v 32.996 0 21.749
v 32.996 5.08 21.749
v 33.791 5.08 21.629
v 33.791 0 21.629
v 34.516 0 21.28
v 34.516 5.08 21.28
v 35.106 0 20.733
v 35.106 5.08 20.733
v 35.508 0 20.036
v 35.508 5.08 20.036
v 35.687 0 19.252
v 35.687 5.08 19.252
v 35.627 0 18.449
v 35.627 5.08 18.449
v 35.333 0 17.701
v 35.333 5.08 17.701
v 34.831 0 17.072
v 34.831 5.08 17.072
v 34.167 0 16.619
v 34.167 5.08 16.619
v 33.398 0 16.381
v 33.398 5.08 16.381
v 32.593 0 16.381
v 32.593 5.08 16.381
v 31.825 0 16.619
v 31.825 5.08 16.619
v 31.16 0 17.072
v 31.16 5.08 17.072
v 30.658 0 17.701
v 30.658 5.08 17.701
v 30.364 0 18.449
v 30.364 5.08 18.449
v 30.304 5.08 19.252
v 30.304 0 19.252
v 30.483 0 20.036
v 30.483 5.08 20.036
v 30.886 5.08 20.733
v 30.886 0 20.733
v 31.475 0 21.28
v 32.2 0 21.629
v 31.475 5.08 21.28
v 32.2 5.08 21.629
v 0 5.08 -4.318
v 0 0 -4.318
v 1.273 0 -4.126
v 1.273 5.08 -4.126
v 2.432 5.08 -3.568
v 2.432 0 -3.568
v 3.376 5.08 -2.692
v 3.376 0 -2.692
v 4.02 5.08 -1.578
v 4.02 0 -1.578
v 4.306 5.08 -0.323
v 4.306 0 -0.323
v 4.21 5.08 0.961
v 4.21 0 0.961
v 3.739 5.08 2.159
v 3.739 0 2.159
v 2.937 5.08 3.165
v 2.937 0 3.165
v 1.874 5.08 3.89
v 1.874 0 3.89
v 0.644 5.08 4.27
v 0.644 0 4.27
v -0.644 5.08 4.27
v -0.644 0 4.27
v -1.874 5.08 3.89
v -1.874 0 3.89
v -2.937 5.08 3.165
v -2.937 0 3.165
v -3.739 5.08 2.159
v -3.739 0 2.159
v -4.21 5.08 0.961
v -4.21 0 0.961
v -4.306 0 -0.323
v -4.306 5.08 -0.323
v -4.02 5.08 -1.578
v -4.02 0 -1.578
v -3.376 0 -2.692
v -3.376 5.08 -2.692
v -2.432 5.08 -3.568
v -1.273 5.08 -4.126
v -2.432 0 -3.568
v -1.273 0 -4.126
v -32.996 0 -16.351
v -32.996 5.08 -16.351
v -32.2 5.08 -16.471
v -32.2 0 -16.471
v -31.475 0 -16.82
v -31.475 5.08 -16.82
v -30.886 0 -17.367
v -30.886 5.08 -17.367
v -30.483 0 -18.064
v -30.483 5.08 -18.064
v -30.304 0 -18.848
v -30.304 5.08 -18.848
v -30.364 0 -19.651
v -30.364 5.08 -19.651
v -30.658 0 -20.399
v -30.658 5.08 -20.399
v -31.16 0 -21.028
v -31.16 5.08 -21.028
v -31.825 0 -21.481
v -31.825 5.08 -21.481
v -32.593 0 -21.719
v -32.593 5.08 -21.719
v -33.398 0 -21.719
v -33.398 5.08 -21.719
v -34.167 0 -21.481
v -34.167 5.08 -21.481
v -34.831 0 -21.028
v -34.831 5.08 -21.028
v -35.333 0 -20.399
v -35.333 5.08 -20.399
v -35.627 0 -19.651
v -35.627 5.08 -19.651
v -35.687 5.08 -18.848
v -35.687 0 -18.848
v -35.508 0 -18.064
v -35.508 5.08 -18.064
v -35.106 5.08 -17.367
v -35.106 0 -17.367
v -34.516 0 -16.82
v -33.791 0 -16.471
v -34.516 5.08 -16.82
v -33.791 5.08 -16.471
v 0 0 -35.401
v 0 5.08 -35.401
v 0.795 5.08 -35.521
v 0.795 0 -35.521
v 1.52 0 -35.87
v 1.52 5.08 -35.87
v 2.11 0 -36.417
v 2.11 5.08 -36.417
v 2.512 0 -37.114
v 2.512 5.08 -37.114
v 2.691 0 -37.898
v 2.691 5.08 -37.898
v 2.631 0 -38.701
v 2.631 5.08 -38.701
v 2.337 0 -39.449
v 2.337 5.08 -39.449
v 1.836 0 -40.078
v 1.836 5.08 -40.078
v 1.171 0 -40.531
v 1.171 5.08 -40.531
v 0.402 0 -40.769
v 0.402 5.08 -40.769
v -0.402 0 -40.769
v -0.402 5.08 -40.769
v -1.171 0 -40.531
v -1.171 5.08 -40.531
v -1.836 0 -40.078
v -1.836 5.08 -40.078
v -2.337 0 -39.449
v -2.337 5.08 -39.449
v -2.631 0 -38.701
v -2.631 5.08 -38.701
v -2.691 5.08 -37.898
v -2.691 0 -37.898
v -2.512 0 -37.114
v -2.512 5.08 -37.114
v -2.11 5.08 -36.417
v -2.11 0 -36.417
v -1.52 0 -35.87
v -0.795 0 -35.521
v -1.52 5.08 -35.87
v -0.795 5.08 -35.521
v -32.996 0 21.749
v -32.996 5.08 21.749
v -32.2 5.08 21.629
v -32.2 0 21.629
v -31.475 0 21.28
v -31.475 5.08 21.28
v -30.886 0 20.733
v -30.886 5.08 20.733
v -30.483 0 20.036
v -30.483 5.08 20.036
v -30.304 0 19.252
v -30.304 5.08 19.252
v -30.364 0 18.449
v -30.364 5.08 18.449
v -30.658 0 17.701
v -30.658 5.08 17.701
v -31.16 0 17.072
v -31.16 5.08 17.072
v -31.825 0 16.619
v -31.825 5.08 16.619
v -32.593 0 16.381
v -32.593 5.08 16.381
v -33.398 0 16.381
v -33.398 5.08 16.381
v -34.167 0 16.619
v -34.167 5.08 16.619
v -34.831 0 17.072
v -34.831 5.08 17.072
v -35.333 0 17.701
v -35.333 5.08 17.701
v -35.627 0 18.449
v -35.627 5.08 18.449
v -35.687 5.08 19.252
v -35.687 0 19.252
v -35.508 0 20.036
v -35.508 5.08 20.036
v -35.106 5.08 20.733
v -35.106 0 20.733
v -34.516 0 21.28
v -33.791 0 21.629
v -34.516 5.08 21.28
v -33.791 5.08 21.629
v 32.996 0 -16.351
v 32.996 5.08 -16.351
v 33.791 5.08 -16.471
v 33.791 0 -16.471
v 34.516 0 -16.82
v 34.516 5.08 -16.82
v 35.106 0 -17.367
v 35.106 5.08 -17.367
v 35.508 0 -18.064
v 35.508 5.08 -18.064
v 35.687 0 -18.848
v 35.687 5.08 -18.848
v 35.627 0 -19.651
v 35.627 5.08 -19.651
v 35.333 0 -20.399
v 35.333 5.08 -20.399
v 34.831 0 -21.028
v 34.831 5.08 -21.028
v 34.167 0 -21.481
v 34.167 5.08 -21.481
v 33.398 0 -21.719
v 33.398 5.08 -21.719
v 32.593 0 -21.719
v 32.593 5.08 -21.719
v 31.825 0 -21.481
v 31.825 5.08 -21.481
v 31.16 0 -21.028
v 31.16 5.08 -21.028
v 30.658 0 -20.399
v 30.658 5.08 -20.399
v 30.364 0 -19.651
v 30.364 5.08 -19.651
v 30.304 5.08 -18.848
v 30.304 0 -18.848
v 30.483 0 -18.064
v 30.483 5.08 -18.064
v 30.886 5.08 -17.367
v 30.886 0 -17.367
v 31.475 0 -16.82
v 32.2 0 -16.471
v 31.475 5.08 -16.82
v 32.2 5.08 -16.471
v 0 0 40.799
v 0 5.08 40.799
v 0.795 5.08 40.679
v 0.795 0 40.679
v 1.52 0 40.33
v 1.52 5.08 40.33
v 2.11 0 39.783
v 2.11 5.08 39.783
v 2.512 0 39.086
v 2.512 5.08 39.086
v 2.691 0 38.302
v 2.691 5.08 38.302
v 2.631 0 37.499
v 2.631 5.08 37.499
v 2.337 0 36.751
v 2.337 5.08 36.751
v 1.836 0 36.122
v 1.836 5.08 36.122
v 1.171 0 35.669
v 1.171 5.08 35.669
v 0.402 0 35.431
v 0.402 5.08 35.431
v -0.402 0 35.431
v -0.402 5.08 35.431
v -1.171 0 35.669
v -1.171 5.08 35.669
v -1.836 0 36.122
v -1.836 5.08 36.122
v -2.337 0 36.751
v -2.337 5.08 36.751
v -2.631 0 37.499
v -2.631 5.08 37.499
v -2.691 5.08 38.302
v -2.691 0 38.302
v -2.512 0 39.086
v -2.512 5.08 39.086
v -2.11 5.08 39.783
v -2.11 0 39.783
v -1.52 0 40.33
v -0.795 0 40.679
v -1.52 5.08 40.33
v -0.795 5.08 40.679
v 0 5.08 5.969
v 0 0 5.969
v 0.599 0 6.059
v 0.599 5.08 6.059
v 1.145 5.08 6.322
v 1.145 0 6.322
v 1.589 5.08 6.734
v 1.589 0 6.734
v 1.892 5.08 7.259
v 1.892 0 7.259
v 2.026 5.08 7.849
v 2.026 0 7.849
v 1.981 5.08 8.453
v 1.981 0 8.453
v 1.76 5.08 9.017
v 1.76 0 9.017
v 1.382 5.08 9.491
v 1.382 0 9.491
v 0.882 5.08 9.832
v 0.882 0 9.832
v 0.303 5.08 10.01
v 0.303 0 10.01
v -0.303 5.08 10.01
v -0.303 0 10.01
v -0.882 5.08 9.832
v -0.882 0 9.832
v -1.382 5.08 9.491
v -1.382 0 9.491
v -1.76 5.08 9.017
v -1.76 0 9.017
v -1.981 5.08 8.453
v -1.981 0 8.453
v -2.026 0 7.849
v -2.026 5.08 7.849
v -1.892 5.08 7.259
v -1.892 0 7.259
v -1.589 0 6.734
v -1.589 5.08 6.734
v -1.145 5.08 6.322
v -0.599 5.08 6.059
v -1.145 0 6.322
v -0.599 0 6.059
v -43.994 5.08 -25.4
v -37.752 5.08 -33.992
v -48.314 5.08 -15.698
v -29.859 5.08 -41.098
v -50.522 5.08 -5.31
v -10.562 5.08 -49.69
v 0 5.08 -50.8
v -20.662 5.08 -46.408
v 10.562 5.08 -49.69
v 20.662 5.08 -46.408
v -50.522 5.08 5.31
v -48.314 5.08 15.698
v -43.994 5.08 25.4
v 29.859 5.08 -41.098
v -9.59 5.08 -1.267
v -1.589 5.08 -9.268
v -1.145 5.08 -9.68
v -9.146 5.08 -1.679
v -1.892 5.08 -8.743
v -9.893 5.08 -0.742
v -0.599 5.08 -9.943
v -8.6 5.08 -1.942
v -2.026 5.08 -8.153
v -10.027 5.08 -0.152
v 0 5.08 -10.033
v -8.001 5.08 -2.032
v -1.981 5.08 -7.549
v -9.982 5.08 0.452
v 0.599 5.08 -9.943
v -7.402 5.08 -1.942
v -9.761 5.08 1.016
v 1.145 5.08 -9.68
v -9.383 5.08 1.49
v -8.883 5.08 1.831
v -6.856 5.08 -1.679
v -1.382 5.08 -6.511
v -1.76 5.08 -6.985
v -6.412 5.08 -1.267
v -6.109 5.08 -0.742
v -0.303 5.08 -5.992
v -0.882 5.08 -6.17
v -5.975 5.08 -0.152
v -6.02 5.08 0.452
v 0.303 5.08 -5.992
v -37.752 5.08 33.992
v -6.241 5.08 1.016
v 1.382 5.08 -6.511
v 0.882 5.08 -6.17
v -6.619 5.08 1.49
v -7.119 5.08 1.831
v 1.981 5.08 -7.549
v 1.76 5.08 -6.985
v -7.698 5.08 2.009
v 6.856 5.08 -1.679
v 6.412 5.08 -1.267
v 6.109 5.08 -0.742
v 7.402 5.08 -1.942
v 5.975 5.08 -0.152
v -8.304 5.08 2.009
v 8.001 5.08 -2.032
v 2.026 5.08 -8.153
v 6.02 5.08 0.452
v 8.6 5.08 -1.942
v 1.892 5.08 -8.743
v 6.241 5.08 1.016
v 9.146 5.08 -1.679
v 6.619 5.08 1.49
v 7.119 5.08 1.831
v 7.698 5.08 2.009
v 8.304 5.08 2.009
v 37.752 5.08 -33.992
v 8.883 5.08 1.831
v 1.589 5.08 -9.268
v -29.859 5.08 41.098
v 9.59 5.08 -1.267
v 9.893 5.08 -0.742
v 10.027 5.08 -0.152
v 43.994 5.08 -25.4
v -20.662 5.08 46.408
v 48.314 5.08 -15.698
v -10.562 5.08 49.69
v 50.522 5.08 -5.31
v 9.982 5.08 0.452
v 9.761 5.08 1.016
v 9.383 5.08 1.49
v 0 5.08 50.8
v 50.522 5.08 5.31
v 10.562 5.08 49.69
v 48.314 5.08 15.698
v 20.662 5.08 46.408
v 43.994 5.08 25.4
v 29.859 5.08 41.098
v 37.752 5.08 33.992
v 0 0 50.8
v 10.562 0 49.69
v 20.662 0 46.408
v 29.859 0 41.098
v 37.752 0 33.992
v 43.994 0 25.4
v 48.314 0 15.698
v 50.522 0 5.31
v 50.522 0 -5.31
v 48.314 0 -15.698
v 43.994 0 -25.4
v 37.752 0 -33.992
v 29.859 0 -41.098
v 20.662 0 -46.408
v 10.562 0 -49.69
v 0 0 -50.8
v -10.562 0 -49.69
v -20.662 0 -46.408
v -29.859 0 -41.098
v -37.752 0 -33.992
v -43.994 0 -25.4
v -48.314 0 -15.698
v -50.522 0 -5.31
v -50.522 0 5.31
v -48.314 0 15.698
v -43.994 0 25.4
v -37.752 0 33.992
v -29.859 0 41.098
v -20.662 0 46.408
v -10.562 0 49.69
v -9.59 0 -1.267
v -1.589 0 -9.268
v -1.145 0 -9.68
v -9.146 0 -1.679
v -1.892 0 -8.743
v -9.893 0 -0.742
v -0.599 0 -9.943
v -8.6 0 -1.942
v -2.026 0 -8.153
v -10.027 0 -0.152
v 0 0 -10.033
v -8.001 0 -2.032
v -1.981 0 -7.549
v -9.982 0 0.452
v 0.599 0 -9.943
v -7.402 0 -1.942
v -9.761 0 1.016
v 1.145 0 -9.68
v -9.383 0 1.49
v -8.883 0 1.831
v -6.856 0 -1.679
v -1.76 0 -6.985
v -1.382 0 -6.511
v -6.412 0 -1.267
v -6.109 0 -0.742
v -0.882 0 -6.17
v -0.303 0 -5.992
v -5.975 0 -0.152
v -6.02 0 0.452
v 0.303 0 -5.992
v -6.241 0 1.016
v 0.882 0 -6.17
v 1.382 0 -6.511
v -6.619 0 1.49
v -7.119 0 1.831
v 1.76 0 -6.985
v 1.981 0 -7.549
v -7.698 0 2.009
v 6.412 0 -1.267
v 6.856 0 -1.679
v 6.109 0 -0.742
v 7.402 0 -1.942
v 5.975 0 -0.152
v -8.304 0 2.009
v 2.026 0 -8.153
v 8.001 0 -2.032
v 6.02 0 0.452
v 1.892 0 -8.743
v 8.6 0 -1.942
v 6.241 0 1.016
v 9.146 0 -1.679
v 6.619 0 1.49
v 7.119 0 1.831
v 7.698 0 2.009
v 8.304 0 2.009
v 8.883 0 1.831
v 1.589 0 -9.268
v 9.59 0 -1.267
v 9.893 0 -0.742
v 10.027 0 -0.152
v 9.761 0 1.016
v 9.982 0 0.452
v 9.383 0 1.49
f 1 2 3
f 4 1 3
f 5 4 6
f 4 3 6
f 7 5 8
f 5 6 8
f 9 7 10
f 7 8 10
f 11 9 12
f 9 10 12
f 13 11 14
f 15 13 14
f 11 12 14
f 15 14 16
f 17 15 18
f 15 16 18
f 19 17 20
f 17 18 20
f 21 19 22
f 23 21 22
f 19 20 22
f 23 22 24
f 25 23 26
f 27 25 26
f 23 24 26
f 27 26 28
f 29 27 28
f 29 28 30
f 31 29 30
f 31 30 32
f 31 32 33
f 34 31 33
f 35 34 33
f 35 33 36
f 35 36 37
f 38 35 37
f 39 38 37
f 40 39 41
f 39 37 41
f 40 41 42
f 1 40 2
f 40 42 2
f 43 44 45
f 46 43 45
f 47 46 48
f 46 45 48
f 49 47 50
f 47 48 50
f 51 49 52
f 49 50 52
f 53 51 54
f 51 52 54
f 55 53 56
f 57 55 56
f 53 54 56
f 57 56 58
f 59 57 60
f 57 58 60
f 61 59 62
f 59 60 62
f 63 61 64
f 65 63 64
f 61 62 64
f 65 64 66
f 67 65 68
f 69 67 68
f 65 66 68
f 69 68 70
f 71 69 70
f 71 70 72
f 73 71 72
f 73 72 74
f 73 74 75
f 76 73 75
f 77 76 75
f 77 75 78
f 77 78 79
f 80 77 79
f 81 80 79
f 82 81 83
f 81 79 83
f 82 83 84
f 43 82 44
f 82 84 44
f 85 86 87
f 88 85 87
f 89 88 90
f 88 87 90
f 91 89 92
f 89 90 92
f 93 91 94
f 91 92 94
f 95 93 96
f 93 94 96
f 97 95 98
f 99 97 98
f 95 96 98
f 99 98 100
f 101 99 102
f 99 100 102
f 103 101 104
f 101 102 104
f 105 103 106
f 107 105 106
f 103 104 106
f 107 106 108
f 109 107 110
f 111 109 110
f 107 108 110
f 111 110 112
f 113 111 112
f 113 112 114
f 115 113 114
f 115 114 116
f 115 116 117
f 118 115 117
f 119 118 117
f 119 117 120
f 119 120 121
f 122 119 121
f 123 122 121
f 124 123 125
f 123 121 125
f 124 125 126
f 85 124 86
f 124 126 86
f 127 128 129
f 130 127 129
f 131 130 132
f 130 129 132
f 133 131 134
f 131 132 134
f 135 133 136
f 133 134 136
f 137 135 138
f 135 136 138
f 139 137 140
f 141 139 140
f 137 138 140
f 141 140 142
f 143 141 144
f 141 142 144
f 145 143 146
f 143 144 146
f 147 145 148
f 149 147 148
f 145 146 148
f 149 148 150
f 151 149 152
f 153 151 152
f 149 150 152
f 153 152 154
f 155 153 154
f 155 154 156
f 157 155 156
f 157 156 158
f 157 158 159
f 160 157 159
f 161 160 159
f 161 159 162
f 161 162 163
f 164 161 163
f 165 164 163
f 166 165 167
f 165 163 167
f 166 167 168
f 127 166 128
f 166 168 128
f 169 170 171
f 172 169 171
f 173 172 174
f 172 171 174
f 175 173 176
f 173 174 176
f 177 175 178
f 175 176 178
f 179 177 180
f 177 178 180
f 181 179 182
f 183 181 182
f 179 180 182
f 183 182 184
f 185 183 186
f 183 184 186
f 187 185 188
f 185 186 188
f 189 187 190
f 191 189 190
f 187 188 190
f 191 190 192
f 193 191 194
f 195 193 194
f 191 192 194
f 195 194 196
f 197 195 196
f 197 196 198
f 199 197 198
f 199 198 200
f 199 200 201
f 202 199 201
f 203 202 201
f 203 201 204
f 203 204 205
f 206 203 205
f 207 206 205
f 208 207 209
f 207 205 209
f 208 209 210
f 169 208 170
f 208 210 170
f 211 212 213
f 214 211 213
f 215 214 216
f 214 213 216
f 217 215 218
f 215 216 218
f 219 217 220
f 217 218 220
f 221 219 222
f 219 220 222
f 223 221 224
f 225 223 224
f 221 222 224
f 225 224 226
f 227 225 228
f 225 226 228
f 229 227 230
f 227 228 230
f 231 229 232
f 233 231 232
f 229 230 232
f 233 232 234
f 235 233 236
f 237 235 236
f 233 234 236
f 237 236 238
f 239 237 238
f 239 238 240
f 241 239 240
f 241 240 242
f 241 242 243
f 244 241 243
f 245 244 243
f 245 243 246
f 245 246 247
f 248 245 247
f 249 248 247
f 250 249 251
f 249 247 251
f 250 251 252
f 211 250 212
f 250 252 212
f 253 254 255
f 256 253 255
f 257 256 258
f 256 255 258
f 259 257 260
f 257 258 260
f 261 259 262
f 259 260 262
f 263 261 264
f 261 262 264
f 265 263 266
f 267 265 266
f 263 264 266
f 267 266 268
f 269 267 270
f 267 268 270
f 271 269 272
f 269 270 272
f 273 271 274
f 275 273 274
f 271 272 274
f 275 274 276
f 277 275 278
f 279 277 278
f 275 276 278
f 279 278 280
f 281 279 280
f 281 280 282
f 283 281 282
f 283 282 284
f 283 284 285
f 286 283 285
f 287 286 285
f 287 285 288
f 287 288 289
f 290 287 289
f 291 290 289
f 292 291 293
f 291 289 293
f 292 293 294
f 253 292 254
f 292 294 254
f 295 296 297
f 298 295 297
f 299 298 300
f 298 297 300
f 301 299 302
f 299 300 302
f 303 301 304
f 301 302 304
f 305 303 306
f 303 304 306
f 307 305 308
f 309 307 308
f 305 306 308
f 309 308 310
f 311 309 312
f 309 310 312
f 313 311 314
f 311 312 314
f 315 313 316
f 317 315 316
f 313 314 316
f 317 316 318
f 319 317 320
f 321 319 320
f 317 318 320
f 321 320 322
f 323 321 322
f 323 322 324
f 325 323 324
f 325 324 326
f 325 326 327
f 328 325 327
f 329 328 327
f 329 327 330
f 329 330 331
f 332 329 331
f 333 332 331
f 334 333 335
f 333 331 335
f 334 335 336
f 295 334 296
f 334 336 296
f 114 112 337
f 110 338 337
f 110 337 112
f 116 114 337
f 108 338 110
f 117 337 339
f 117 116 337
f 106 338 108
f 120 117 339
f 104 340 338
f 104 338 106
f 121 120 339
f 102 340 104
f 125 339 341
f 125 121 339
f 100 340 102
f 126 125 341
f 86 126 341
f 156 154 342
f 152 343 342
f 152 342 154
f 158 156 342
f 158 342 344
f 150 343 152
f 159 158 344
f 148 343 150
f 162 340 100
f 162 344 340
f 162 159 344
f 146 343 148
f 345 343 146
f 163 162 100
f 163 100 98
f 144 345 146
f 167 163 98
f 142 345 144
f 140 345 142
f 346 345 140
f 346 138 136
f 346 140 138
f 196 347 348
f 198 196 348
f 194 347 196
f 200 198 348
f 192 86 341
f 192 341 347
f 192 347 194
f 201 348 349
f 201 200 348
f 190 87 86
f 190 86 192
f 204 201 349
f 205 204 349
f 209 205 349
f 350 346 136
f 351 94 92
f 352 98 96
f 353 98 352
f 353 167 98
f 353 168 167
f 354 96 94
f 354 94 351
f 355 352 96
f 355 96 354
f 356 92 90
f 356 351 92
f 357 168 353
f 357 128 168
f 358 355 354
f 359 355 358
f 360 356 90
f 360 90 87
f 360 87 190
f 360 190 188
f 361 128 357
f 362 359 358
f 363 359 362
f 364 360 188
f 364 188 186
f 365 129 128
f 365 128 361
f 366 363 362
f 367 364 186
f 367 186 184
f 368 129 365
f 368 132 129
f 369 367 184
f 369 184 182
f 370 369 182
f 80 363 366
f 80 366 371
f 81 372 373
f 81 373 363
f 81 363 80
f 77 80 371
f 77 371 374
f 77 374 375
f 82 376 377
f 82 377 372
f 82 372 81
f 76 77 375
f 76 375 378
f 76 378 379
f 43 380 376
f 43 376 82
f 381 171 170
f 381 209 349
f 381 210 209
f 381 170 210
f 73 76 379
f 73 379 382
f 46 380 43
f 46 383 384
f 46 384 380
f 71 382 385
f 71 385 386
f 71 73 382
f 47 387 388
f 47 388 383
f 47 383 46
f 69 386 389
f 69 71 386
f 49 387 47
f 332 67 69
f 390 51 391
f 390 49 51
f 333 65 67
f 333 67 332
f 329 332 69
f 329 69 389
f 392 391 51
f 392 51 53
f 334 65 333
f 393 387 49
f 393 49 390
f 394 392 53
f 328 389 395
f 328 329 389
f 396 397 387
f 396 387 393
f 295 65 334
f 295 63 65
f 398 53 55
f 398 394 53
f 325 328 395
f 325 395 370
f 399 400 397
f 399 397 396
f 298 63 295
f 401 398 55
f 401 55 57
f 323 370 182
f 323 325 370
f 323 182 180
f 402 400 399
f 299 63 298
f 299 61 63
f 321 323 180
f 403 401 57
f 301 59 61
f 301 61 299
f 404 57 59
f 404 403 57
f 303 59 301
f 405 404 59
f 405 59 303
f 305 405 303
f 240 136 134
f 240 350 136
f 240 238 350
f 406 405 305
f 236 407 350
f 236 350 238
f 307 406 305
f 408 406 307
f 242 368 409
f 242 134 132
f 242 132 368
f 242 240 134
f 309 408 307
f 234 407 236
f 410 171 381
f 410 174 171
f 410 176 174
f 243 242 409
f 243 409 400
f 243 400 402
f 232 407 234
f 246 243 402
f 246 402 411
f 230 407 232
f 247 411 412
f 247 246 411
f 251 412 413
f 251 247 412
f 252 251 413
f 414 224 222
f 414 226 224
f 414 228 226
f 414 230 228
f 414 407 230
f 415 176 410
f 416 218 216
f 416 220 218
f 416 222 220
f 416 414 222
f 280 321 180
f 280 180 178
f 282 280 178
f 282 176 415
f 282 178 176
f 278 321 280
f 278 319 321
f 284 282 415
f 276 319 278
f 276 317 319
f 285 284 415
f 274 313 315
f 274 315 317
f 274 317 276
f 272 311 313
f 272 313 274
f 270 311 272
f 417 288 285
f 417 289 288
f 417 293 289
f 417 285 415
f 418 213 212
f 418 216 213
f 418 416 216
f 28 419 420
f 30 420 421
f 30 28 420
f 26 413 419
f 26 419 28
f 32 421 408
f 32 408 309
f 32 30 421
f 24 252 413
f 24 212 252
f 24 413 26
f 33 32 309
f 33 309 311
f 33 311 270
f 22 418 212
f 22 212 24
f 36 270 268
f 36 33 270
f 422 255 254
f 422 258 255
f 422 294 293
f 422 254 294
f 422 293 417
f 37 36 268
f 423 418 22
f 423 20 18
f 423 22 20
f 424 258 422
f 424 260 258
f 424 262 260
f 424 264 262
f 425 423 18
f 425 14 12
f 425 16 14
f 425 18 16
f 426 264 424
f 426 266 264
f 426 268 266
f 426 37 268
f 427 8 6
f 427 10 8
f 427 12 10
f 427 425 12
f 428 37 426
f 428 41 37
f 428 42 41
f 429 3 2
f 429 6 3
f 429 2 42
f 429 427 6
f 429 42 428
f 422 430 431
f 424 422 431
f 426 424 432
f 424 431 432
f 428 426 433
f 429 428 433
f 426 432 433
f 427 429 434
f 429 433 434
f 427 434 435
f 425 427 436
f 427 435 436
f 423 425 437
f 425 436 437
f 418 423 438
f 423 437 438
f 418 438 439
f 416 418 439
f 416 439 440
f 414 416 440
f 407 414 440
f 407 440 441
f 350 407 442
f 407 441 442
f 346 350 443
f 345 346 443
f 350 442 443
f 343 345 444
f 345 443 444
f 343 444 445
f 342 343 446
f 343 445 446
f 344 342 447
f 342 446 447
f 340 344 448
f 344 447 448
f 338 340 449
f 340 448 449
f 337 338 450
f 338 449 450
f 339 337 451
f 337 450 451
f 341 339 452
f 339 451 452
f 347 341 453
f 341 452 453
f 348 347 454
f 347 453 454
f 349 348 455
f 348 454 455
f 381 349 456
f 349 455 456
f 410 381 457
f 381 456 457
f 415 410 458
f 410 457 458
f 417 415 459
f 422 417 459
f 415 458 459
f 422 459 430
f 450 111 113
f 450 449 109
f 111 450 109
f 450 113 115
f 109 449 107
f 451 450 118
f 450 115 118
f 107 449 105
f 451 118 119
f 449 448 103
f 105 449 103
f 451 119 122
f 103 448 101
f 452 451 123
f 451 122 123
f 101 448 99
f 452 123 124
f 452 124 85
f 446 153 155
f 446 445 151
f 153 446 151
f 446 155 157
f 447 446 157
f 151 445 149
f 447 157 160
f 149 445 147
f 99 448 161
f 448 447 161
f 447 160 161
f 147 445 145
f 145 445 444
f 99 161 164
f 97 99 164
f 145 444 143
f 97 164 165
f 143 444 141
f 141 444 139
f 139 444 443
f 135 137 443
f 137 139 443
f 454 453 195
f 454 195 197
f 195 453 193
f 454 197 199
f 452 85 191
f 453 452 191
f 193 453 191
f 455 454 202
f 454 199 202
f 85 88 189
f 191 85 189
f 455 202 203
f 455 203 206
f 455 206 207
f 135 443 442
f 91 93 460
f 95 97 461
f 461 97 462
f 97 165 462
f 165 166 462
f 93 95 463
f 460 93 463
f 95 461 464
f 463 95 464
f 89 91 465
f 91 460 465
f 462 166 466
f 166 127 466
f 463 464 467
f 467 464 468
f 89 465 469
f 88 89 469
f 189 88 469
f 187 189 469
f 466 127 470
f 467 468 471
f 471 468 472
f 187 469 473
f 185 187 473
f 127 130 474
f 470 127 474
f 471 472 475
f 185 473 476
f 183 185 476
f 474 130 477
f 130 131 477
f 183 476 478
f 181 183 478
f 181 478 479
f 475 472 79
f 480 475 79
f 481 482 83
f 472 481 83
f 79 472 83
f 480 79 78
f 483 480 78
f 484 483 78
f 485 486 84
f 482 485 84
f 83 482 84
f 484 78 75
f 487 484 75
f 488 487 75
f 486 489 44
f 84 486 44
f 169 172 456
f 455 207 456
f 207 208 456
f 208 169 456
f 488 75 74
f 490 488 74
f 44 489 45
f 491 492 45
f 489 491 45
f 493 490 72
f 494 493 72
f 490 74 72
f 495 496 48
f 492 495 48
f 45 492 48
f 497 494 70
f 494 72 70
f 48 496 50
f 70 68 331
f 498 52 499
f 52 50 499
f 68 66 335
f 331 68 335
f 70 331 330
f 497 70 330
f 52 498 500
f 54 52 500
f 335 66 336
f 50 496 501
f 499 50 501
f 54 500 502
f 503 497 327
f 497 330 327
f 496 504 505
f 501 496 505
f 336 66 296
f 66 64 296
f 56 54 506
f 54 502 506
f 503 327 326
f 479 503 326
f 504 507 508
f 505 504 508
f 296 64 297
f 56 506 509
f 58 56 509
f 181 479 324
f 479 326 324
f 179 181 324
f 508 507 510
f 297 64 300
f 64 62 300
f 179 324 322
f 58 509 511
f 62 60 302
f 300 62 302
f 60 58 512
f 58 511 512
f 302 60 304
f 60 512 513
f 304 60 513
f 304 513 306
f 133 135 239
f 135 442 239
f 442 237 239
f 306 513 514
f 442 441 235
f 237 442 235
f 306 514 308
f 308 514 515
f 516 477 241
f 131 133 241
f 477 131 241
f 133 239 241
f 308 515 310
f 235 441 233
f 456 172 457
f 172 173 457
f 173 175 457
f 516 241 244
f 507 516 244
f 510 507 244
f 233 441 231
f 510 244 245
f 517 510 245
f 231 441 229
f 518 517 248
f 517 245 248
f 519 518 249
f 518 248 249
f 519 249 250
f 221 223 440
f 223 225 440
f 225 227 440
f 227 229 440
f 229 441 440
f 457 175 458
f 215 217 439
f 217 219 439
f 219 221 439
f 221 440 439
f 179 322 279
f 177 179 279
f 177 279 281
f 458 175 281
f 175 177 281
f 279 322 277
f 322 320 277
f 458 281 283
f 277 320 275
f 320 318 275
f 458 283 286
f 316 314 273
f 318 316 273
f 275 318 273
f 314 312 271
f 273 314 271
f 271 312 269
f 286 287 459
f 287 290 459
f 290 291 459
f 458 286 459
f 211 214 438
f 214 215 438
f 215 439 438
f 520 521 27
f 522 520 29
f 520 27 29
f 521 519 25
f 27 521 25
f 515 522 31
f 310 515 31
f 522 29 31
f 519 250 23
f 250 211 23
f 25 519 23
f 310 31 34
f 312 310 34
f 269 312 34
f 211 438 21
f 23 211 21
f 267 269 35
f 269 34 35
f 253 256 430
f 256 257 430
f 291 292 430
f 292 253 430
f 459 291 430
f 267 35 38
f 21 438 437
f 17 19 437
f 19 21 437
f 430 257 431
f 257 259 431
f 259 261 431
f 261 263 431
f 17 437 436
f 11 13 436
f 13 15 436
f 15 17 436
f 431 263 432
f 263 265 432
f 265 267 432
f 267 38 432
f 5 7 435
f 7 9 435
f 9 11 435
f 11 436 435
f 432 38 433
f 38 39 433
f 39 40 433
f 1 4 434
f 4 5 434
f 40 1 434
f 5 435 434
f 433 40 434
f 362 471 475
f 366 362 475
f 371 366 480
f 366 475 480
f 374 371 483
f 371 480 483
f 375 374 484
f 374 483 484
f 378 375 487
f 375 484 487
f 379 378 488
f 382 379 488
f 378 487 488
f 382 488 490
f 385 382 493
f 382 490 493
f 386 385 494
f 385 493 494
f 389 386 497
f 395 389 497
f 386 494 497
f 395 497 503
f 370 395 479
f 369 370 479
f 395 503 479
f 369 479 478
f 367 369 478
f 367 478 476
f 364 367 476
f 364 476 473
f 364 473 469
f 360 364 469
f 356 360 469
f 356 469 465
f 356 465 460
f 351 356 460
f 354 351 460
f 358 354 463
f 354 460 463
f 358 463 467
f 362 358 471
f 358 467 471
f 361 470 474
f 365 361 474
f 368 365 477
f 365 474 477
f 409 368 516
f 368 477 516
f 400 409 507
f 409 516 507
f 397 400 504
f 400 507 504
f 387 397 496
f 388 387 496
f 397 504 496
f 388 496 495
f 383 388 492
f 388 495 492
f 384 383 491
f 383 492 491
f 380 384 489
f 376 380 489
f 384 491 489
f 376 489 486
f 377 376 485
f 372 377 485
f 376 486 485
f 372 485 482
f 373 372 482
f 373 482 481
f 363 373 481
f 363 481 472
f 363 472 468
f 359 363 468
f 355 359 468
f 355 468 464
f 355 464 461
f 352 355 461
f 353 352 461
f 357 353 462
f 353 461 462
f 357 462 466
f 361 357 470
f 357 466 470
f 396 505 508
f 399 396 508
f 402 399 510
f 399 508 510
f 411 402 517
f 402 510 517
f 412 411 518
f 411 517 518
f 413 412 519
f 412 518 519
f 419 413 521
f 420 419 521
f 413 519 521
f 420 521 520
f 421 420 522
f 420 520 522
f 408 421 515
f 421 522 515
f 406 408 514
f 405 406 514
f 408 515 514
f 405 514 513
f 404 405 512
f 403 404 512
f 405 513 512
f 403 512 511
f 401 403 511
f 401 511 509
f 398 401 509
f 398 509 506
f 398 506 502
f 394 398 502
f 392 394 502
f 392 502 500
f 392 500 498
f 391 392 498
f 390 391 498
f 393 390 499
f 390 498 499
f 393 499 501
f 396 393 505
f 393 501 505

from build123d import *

# Parameters (mm, degrees)
SKETCH1_R           = 50.8
BOSS_EXTRUDE1_DEPTH = 5.08
SKETCH2_R           = 2.69875
CUT_EXTRUDE1_DEPTH  = 5.08
SKETCH3_R           = 4.318
SKETCH3_R_2         = 2.032
CUT_EXTRUDE2_DEPTH  = 5.08


with BuildPart() as part:
    # Sketch1 → Boss-Extrude1 (new body)
    with BuildSketch(Plane(origin=(0, 0, 0), x_dir=(1, 0, 0), z_dir=(0, 1, 0))):
        with Locations(Location((0, 0, 0), (0, 0, 270))):
            Circle(SKETCH1_R)
    extrude(amount=BOSS_EXTRUDE1_DEPTH)

    # Sketch2 → Cut-Extrude1 (cut)
    with BuildSketch(Plane(origin=(0, 5.08, 0), x_dir=(1, 0, 0), z_dir=(0, 1, 0))):
        with Locations(Location((0, -38.1, 0), (0, 0, 270))):
            Circle(SKETCH2_R)
        with Locations(Location((-32.995567884, -19.05, 0), (0, 0, 270))):
            Circle(SKETCH2_R)
        with Locations(Location((-32.995567884, 19.05, 0), (0, 0, 270))):
            Circle(SKETCH2_R)
        with Locations(Location((0, 38.1, 0), (0, 0, 270))):
            Circle(SKETCH2_R)
        with Locations(Location((32.995567884, 19.05, 0), (0, 0, 270))):
            Circle(SKETCH2_R)
        with Locations(Location((32.995567884, -19.05, 0), (0, 0, 270))):
            Circle(SKETCH2_R)
    extrude(amount=-CUT_EXTRUDE1_DEPTH, mode=Mode.SUBTRACT)

    # Sketch3 → Cut-Extrude2 (cut)
    with BuildSketch(Plane.XZ):
        with Locations(Location((0, 0, 0), (0, 0, 270))):
            Circle(SKETCH3_R)
        with Locations(Location((0, -8.001, 0), (0, 0, 270))):
            Circle(SKETCH3_R_2)
        with Locations(Location((-8.001, 0, 0), (0, 0, 270))):
            Circle(SKETCH3_R_2)
        with Locations(Location((0, 8.001, 0), (0, 0, 270))):
            Circle(SKETCH3_R_2)
        with Locations(Location((8.001, 0, 0), (0, 0, 270))):
            Circle(SKETCH3_R_2)
    extrude(amount=-CUT_EXTRUDE2_DEPTH, mode=Mode.SUBTRACT)


solid = part.part
